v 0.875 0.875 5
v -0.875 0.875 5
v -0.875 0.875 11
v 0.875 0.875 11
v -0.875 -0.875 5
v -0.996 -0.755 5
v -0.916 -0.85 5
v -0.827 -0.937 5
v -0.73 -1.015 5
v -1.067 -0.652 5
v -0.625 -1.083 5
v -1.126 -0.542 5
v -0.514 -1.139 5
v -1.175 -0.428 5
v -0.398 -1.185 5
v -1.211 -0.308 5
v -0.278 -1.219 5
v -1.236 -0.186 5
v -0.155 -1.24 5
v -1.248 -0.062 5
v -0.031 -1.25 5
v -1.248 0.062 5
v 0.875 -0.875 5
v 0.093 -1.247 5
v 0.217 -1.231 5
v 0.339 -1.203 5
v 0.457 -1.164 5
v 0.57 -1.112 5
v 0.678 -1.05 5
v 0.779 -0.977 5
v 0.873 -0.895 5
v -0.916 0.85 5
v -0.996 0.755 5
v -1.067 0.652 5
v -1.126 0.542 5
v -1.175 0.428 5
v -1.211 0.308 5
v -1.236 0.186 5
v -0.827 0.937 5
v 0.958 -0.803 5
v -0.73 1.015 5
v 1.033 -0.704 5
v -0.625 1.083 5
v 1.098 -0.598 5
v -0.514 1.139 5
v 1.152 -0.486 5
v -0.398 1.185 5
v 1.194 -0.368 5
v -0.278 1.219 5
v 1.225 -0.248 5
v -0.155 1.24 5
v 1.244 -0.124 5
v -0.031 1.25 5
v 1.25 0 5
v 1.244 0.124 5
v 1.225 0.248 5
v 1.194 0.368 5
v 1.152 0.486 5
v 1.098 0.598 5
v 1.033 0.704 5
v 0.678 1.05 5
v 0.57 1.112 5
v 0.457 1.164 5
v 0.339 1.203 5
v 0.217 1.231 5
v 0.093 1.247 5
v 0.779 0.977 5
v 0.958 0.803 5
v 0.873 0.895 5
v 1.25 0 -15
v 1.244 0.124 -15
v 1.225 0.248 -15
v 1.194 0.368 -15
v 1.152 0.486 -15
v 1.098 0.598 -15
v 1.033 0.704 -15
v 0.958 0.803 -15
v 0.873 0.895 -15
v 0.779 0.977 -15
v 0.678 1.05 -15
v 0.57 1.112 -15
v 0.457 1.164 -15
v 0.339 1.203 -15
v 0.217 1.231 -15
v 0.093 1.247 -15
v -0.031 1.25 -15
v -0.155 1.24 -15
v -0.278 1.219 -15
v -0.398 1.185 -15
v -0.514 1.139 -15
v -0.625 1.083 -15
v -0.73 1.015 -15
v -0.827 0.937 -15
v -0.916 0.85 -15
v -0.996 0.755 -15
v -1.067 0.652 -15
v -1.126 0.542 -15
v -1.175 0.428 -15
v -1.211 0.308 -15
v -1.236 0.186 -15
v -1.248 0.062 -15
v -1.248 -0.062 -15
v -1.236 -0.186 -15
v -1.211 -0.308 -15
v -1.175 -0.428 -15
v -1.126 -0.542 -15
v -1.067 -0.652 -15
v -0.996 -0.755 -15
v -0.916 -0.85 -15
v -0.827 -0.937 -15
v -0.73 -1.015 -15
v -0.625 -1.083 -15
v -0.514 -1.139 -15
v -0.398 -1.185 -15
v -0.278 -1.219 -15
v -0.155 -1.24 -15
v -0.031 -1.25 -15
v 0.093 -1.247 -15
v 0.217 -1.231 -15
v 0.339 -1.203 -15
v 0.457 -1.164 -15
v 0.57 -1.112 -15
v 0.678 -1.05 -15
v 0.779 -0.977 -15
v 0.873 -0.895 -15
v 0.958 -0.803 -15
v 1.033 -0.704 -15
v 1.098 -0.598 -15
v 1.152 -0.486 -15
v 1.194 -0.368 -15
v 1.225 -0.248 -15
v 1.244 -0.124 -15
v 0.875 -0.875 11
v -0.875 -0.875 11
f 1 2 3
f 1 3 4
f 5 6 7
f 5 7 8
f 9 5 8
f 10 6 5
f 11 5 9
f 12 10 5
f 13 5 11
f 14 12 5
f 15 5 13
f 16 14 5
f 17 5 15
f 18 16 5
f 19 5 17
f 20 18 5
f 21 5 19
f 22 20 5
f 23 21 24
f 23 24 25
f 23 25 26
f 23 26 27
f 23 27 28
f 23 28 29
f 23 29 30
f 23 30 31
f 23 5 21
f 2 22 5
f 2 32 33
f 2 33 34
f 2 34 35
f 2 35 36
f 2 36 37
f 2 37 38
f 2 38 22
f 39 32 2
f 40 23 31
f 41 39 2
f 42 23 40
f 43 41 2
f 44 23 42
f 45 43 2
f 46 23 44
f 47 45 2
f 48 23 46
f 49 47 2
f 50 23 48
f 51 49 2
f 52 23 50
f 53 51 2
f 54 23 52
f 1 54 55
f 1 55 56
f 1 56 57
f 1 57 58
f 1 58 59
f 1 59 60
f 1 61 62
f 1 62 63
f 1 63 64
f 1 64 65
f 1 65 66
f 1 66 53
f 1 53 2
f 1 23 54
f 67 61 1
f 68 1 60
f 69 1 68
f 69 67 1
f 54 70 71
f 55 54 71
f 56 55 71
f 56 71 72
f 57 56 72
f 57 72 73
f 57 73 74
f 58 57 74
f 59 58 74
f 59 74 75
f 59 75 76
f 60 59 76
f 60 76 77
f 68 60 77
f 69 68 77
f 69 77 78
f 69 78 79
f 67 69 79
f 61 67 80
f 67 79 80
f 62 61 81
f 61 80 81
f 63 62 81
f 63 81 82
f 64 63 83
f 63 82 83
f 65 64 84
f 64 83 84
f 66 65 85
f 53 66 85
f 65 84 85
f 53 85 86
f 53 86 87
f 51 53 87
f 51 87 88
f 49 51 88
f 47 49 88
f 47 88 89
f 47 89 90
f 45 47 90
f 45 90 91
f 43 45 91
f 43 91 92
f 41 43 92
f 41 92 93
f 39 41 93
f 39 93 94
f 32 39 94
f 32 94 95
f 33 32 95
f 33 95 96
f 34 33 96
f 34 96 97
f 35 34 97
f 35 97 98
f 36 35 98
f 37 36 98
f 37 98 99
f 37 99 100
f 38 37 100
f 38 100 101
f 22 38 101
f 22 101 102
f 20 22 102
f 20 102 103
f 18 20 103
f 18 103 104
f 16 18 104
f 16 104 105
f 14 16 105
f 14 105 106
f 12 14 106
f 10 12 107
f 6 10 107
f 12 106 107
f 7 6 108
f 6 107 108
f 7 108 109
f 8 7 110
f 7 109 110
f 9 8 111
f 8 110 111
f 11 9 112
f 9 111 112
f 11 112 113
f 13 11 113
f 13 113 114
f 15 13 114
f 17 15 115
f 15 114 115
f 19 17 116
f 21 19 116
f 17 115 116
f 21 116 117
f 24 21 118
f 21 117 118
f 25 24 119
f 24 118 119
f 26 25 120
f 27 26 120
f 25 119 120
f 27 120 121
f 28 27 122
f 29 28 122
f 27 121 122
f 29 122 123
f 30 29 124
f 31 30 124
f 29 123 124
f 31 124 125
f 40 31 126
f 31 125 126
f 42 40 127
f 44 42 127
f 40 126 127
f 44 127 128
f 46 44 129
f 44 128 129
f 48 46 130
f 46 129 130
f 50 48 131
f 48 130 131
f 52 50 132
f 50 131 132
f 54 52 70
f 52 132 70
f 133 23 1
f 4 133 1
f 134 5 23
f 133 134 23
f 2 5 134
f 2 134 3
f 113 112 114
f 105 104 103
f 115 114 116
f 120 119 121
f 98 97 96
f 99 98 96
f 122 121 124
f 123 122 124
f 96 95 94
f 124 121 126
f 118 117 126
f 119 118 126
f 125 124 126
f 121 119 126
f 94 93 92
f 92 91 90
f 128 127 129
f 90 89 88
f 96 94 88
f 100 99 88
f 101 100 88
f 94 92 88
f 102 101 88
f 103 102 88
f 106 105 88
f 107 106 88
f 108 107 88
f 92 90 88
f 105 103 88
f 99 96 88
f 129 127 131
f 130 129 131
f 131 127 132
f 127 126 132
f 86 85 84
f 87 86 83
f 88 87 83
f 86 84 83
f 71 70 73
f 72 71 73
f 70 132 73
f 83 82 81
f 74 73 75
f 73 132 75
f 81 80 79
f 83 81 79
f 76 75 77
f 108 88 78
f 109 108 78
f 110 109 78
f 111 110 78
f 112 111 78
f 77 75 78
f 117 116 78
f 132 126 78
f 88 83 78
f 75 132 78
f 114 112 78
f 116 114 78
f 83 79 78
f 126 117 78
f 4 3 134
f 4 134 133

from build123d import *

# Parameters (mm, degrees)
SKETCH1_R           = 1.25
BOSS_EXTRUDE1_DEPTH = 5
SKETCH2_W           = 1.75
SKETCH2_H           = 1.75
BOSS_EXTRUDE2_DEPTH = 6
BOSS_EXTRUDE3_START = -15
SKETCH3_R           = 1.25
BOSS_EXTRUDE3_DEPTH = 15


with BuildPart() as part:
    # Sketch1 → Boss-Extrude1 (new body)
    with BuildSketch(Plane.XY):
        Circle(SKETCH1_R)
    extrude(amount=BOSS_EXTRUDE1_DEPTH)

    # Sketch2 → Boss-Extrude2 (add)
    with BuildSketch(Plane.XY.offset(5)):
        Rectangle(SKETCH2_W, SKETCH2_H)
    extrude(amount=BOSS_EXTRUDE2_DEPTH)

    # Sketch3 → Boss-Extrude3 (add)
    with BuildSketch(Plane.XY.offset(BOSS_EXTRUDE3_START)):
        Circle(SKETCH3_R)
    extrude(amount=BOSS_EXTRUDE3_DEPTH)


solid = part.part
